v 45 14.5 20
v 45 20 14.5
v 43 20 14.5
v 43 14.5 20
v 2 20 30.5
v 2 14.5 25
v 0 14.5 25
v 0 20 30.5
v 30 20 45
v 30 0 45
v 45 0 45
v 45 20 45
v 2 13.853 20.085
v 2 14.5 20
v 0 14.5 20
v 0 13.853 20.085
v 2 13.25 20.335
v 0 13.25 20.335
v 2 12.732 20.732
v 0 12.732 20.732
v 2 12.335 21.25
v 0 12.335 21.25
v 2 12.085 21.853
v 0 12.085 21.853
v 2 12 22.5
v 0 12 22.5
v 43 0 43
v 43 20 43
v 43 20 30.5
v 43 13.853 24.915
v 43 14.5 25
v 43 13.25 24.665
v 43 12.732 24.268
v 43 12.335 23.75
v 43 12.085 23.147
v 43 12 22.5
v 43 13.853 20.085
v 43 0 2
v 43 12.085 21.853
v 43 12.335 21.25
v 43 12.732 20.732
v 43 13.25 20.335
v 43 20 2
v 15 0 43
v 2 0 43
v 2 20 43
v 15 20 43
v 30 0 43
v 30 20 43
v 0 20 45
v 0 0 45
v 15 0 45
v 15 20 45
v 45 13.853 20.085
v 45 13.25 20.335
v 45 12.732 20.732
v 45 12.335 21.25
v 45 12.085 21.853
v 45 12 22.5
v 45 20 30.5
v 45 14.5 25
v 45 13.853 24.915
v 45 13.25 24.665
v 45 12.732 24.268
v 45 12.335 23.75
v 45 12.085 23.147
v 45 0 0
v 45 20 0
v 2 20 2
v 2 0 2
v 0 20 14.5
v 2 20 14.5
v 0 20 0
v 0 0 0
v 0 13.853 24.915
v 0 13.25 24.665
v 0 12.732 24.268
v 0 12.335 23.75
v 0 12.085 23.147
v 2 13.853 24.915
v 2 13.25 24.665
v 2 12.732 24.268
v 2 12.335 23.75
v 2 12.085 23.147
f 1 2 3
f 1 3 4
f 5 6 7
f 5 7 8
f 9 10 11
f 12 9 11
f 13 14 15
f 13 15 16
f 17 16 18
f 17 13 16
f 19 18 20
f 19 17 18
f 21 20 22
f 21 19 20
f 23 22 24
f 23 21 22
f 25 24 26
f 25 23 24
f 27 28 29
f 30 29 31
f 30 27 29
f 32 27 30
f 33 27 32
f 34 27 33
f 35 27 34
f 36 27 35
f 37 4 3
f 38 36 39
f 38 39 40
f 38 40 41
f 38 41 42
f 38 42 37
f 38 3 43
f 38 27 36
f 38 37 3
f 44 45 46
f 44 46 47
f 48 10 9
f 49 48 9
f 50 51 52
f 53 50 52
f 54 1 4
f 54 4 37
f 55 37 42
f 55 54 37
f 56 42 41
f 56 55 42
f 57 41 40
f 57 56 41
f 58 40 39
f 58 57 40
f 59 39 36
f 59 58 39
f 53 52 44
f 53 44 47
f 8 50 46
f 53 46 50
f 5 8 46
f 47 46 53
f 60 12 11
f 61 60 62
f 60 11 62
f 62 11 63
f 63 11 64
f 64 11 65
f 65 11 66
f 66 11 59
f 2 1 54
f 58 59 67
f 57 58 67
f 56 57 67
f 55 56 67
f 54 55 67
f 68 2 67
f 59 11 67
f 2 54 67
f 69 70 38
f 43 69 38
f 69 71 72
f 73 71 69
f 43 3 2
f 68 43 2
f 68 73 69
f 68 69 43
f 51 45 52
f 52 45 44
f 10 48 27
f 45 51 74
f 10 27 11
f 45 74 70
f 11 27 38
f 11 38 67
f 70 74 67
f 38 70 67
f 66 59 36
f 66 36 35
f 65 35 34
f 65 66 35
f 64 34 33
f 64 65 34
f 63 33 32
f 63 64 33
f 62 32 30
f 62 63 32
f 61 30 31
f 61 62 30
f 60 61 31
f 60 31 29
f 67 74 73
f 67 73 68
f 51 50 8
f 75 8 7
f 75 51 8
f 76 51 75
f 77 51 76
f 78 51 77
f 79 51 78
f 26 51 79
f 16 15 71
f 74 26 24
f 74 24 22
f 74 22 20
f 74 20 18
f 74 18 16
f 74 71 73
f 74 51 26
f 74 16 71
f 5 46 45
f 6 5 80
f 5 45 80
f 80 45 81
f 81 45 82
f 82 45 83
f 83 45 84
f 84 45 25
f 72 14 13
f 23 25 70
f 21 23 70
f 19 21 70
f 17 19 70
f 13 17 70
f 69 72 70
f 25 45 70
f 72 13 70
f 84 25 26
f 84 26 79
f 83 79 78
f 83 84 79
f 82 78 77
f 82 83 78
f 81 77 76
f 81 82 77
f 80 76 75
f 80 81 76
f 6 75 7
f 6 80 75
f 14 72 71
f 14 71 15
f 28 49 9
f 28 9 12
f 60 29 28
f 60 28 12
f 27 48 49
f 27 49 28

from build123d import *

# Parameters (mm, degrees)
SKICA1_W                      = 45
SKICA1_H                      = 45
SKICA1_W_2                    = 41
SKICA1_H_2                    = 41
P_IDAT_VYSUNUT_M1_DEPTH       = 20
ODEBRAT_VYSUNUT_M1_REACH      = 68.708
SKICA2_W                      = 15
SKICA2_H                      = 20
ODEBRAT_VYSUNUT_M2_DEPTH      = 67.708320321
ODEBRAT_VYSUNUT_M2_DEPTH_BACK = 67.708320321


with BuildPart() as part:
    # Skica1 → Přidat vysunutím1 (new body)
    with BuildSketch(Plane(origin=(0, 0, 0), x_dir=(1, 0, 0), z_dir=(0, 1, 0))):
        with Locations((22.5, -22.5)):
            Rectangle(SKICA1_W, SKICA1_H)
        with Locations((22.5, -22.5)):
            Rectangle(SKICA1_W_2, SKICA1_H_2, mode=Mode.SUBTRACT)
    extrude(amount=P_IDAT_VYSUNUT_M1_DEPTH)

    # Skica2 → Odebrat vysunutím1 (cut, up to next)
    with BuildSketch(Plane.XY.offset(45), mode=Mode.PRIVATE) as odebrat_vysunut_m1_sk1:
        with Locations((22.5, 10)):
            Rectangle(SKICA2_W, SKICA2_H)
    odebrat_vysunut_m1_tool1 = extrude(odebrat_vysunut_m1_sk1.sketch, amount=-ODEBRAT_VYSUNUT_M1_REACH, mode=Mode.PRIVATE) & part.part
    add(odebrat_vysunut_m1_tool1.solids().sort_by_distance((22.5, 10, 45))[0], mode=Mode.SUBTRACT)

    # Skica3 → Odebrat vysunutím2 (cut, two sides: drawn at the far end of the back side and taken through both)
    with BuildSketch(Plane.ZY.offset(-ODEBRAT_VYSUNUT_M2_DEPTH_BACK)):
        with BuildLine():
            ThreePointArc((25, 14.5), (24.267766953, 16.267766953), (22.5, 17))
            Line((22.5, 17), (22.5, 14.5))
            Line((22.5, 14.5), (25, 14.5))
        make_face()
        with BuildLine():
            Line((22.5, 14.5), (22.5, 17))
            ThreePointArc((22.5, 17), (20.732233047, 16.267766953), (20, 14.5))
            Line((20, 14.5), (22.5, 14.5))
        make_face()
        with BuildLine():
            Line((25, 14.5), (22.5, 14.5))
            Line((22.5, 14.5), (22.5, 12))
            ThreePointArc((22.5, 12), (24.267766953, 12.732233047), (25, 14.5))
        make_face()
        with BuildLine():
            Line((22.5, 12), (22.5, 14.5))
            Line((22.5, 14.5), (20, 14.5))
            ThreePointArc((20, 14.5), (20.732233047, 12.732233047), (22.5, 12))
        make_face()
        with BuildLine():
            Line((30.5, 20), (22.5, 20))
            Line((22.5, 20), (22.5, 17))
            ThreePointArc((22.5, 17), (24.267766953, 16.267766953), (25, 14.5))
            Line((25, 14.5), (30.5, 20))
        make_face()
        with BuildLine():
            Line((22.5, 17), (22.5, 20))
            Line((22.5, 20), (14.5, 20))
            Line((14.5, 20), (20, 14.5))
            ThreePointArc((20, 14.5), (20.732233047, 16.267766953), (22.5, 17))
        make_face()
    extrude(amount=ODEBRAT_VYSUNUT_M2_DEPTH + ODEBRAT_VYSUNUT_M2_DEPTH_BACK, mode=Mode.SUBTRACT)


solid = part.part
